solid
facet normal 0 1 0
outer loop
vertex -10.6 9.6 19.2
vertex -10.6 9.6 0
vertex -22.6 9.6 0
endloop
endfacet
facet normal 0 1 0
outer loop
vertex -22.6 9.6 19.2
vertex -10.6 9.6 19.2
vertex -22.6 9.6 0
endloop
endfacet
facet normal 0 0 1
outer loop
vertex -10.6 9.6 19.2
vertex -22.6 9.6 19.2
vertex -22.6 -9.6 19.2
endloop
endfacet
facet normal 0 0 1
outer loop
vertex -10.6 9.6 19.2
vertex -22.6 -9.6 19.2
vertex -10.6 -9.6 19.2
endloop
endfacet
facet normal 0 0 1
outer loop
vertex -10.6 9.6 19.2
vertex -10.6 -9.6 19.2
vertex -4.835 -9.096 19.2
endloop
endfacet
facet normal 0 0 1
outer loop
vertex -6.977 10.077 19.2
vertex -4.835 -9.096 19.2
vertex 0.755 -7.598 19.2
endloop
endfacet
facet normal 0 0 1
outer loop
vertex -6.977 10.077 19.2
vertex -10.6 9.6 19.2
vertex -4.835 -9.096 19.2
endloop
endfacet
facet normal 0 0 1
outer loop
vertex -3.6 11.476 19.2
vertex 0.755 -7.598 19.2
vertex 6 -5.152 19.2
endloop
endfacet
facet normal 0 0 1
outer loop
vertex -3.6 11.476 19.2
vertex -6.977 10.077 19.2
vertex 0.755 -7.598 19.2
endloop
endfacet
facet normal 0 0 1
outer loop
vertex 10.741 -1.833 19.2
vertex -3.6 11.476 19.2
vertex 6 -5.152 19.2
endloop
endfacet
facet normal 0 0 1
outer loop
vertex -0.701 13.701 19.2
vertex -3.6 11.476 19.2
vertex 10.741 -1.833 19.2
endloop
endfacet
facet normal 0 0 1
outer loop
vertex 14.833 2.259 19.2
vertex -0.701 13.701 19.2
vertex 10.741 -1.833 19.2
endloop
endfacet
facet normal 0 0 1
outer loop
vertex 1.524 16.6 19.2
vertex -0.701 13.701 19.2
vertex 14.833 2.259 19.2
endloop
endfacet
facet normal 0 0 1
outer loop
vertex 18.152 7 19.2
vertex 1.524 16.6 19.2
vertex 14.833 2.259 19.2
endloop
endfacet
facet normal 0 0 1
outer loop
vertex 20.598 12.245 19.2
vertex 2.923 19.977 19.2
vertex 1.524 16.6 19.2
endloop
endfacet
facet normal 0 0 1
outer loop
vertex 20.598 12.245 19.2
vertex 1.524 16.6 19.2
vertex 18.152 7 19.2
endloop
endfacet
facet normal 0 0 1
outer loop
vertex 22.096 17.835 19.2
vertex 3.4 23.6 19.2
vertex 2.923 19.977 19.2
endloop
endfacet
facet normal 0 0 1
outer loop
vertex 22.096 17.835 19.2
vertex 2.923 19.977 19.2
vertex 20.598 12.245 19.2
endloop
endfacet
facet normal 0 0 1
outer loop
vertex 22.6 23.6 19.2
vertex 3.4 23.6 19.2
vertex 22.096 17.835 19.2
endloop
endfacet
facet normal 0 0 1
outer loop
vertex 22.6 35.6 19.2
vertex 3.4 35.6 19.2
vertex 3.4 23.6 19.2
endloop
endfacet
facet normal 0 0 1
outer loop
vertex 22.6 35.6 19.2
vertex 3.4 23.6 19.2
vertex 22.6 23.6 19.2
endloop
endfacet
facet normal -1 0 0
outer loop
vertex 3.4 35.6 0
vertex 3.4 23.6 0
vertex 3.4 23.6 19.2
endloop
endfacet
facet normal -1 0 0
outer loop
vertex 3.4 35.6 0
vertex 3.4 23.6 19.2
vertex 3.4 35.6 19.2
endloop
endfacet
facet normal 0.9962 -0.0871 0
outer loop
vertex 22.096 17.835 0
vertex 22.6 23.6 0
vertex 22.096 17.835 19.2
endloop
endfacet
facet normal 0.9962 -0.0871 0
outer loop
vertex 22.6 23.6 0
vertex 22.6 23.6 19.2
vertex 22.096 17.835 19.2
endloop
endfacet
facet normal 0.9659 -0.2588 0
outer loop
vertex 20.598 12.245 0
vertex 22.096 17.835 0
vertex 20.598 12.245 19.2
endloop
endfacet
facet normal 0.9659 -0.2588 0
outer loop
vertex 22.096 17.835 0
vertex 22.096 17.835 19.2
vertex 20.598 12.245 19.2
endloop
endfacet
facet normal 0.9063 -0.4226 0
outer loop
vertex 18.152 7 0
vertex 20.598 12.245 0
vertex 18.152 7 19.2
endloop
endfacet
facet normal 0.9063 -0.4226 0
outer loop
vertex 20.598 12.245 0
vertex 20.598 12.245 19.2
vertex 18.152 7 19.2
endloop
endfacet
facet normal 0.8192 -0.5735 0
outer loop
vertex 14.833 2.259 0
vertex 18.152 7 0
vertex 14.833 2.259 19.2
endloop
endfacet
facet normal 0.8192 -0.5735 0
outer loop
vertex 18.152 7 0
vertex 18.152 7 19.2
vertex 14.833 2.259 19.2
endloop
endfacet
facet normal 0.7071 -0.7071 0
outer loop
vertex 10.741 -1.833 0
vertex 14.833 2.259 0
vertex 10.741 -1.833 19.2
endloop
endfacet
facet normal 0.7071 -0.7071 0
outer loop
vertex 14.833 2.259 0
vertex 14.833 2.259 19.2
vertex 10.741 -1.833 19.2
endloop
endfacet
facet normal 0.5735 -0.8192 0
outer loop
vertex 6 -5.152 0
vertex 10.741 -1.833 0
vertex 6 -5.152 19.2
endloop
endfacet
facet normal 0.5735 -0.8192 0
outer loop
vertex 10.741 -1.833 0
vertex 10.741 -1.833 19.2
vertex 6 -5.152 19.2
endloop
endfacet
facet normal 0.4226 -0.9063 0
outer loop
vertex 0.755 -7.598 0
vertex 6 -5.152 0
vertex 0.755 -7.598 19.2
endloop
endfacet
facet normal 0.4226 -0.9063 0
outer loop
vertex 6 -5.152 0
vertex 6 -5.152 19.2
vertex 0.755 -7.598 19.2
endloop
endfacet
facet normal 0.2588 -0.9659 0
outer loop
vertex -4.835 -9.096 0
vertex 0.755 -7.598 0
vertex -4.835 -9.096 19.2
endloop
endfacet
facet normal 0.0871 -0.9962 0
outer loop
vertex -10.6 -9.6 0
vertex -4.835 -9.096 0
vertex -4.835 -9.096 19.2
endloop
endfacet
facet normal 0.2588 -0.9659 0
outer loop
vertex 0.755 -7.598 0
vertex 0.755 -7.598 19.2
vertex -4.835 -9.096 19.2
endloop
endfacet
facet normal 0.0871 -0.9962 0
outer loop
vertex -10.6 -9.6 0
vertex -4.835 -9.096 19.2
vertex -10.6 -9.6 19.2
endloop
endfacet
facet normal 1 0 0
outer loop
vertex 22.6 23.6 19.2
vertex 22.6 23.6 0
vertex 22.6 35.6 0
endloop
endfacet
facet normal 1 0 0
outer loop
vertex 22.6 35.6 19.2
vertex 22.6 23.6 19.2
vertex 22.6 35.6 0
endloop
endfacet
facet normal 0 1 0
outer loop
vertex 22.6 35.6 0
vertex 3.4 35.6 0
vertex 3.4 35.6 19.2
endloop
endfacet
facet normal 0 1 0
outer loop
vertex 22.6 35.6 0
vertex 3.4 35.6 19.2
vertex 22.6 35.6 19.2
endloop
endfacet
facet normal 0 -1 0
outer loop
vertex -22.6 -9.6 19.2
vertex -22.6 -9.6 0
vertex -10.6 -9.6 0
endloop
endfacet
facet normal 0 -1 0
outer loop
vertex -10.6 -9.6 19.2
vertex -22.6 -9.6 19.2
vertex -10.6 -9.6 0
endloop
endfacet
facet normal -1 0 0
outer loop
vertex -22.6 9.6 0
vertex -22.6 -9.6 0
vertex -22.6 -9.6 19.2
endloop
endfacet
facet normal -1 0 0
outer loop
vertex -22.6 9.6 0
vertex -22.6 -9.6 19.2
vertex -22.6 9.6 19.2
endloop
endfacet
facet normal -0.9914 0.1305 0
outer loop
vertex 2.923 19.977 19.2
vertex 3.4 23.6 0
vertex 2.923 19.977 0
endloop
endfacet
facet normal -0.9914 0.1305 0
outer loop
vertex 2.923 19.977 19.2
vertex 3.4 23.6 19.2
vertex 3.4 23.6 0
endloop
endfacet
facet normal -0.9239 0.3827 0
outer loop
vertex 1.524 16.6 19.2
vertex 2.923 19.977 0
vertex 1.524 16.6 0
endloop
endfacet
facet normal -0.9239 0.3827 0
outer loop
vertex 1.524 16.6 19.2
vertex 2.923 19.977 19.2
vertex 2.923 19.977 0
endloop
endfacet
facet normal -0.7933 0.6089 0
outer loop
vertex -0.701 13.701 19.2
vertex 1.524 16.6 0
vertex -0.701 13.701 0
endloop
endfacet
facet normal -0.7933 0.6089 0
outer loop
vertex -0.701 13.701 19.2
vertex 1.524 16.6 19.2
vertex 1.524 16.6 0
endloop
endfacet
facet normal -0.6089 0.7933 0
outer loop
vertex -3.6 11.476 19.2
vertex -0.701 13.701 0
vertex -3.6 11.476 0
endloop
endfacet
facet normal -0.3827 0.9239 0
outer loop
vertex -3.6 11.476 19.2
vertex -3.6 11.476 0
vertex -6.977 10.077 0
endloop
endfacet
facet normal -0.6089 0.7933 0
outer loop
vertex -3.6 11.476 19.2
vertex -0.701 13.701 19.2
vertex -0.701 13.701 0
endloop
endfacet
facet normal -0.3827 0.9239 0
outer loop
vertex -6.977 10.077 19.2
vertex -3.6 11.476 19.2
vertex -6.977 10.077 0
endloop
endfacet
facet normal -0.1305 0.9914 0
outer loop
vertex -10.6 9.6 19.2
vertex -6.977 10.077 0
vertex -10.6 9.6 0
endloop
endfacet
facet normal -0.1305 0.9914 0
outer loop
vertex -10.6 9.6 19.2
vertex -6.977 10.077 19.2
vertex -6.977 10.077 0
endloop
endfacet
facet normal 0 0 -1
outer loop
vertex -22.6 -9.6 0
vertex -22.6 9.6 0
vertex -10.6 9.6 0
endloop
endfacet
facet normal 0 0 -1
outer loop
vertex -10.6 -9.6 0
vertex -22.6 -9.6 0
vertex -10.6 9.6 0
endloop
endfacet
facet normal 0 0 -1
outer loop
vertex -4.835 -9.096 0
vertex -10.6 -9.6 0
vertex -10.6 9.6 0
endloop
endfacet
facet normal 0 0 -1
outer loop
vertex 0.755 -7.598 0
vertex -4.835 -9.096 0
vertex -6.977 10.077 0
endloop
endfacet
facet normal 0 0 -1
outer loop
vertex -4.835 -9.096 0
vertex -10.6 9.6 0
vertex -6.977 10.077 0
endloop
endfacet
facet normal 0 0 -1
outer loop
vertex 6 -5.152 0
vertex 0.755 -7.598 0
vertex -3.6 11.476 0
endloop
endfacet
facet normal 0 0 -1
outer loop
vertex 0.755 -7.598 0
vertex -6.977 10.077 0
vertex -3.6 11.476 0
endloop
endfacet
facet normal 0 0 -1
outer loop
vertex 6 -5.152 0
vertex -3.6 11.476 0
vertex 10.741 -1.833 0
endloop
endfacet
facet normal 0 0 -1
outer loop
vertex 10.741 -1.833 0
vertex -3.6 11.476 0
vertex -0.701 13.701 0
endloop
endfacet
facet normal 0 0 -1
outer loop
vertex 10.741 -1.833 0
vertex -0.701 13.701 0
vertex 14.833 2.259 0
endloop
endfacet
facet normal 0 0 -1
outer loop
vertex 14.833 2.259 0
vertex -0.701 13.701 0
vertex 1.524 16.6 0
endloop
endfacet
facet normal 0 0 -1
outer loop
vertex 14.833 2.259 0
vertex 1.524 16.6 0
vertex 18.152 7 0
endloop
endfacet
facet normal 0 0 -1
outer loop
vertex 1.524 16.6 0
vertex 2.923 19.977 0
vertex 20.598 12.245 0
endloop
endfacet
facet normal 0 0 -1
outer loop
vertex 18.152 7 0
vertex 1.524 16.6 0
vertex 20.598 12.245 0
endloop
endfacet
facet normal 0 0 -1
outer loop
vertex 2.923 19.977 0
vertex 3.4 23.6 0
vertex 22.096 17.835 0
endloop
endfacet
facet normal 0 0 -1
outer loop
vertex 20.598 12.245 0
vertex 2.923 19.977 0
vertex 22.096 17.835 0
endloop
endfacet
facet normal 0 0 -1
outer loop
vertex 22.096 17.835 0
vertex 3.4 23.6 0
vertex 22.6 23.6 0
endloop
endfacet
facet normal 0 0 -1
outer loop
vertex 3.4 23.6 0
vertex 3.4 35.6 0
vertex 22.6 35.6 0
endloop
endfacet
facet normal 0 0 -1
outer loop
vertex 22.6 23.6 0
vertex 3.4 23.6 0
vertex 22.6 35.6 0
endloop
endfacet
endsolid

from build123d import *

# Parameters (mm, degrees)
F0_W     = 19.2
F0_H     = 19.2
F0_W_2   = 26
F0_H_2   = 26
F1_DEPTH = 19.2
F2_R     = 14
F3_R     = 33.2


with BuildPart() as f1:
    # F0 (on Top) → F1 (new body)
    with BuildSketch(Plane.XY):
        with Locations((13, 0)):
            Rectangle(F0_W, F0_H)
        with Locations((-9.6, 0)):
            Rectangle(F0_W_2, F0_H)
        with Locations((13, 22.6)):
            Rectangle(F0_W, F0_H_2)
    extrude(amount=F1_DEPTH)

    # F2
    f2_edges = [f1.edges().sort_by_distance(p)[0] for p in [
        (3.4, 9.6, 9.6),
    ]]
    fillet(f2_edges, radius=F2_R)

    # F3
    f3_edges = [f1.edges().sort_by_distance(p)[0] for p in [
        (22.6, -9.6, 9.6),
    ]]
    fillet(f3_edges, radius=F3_R)


solid = f1.part
